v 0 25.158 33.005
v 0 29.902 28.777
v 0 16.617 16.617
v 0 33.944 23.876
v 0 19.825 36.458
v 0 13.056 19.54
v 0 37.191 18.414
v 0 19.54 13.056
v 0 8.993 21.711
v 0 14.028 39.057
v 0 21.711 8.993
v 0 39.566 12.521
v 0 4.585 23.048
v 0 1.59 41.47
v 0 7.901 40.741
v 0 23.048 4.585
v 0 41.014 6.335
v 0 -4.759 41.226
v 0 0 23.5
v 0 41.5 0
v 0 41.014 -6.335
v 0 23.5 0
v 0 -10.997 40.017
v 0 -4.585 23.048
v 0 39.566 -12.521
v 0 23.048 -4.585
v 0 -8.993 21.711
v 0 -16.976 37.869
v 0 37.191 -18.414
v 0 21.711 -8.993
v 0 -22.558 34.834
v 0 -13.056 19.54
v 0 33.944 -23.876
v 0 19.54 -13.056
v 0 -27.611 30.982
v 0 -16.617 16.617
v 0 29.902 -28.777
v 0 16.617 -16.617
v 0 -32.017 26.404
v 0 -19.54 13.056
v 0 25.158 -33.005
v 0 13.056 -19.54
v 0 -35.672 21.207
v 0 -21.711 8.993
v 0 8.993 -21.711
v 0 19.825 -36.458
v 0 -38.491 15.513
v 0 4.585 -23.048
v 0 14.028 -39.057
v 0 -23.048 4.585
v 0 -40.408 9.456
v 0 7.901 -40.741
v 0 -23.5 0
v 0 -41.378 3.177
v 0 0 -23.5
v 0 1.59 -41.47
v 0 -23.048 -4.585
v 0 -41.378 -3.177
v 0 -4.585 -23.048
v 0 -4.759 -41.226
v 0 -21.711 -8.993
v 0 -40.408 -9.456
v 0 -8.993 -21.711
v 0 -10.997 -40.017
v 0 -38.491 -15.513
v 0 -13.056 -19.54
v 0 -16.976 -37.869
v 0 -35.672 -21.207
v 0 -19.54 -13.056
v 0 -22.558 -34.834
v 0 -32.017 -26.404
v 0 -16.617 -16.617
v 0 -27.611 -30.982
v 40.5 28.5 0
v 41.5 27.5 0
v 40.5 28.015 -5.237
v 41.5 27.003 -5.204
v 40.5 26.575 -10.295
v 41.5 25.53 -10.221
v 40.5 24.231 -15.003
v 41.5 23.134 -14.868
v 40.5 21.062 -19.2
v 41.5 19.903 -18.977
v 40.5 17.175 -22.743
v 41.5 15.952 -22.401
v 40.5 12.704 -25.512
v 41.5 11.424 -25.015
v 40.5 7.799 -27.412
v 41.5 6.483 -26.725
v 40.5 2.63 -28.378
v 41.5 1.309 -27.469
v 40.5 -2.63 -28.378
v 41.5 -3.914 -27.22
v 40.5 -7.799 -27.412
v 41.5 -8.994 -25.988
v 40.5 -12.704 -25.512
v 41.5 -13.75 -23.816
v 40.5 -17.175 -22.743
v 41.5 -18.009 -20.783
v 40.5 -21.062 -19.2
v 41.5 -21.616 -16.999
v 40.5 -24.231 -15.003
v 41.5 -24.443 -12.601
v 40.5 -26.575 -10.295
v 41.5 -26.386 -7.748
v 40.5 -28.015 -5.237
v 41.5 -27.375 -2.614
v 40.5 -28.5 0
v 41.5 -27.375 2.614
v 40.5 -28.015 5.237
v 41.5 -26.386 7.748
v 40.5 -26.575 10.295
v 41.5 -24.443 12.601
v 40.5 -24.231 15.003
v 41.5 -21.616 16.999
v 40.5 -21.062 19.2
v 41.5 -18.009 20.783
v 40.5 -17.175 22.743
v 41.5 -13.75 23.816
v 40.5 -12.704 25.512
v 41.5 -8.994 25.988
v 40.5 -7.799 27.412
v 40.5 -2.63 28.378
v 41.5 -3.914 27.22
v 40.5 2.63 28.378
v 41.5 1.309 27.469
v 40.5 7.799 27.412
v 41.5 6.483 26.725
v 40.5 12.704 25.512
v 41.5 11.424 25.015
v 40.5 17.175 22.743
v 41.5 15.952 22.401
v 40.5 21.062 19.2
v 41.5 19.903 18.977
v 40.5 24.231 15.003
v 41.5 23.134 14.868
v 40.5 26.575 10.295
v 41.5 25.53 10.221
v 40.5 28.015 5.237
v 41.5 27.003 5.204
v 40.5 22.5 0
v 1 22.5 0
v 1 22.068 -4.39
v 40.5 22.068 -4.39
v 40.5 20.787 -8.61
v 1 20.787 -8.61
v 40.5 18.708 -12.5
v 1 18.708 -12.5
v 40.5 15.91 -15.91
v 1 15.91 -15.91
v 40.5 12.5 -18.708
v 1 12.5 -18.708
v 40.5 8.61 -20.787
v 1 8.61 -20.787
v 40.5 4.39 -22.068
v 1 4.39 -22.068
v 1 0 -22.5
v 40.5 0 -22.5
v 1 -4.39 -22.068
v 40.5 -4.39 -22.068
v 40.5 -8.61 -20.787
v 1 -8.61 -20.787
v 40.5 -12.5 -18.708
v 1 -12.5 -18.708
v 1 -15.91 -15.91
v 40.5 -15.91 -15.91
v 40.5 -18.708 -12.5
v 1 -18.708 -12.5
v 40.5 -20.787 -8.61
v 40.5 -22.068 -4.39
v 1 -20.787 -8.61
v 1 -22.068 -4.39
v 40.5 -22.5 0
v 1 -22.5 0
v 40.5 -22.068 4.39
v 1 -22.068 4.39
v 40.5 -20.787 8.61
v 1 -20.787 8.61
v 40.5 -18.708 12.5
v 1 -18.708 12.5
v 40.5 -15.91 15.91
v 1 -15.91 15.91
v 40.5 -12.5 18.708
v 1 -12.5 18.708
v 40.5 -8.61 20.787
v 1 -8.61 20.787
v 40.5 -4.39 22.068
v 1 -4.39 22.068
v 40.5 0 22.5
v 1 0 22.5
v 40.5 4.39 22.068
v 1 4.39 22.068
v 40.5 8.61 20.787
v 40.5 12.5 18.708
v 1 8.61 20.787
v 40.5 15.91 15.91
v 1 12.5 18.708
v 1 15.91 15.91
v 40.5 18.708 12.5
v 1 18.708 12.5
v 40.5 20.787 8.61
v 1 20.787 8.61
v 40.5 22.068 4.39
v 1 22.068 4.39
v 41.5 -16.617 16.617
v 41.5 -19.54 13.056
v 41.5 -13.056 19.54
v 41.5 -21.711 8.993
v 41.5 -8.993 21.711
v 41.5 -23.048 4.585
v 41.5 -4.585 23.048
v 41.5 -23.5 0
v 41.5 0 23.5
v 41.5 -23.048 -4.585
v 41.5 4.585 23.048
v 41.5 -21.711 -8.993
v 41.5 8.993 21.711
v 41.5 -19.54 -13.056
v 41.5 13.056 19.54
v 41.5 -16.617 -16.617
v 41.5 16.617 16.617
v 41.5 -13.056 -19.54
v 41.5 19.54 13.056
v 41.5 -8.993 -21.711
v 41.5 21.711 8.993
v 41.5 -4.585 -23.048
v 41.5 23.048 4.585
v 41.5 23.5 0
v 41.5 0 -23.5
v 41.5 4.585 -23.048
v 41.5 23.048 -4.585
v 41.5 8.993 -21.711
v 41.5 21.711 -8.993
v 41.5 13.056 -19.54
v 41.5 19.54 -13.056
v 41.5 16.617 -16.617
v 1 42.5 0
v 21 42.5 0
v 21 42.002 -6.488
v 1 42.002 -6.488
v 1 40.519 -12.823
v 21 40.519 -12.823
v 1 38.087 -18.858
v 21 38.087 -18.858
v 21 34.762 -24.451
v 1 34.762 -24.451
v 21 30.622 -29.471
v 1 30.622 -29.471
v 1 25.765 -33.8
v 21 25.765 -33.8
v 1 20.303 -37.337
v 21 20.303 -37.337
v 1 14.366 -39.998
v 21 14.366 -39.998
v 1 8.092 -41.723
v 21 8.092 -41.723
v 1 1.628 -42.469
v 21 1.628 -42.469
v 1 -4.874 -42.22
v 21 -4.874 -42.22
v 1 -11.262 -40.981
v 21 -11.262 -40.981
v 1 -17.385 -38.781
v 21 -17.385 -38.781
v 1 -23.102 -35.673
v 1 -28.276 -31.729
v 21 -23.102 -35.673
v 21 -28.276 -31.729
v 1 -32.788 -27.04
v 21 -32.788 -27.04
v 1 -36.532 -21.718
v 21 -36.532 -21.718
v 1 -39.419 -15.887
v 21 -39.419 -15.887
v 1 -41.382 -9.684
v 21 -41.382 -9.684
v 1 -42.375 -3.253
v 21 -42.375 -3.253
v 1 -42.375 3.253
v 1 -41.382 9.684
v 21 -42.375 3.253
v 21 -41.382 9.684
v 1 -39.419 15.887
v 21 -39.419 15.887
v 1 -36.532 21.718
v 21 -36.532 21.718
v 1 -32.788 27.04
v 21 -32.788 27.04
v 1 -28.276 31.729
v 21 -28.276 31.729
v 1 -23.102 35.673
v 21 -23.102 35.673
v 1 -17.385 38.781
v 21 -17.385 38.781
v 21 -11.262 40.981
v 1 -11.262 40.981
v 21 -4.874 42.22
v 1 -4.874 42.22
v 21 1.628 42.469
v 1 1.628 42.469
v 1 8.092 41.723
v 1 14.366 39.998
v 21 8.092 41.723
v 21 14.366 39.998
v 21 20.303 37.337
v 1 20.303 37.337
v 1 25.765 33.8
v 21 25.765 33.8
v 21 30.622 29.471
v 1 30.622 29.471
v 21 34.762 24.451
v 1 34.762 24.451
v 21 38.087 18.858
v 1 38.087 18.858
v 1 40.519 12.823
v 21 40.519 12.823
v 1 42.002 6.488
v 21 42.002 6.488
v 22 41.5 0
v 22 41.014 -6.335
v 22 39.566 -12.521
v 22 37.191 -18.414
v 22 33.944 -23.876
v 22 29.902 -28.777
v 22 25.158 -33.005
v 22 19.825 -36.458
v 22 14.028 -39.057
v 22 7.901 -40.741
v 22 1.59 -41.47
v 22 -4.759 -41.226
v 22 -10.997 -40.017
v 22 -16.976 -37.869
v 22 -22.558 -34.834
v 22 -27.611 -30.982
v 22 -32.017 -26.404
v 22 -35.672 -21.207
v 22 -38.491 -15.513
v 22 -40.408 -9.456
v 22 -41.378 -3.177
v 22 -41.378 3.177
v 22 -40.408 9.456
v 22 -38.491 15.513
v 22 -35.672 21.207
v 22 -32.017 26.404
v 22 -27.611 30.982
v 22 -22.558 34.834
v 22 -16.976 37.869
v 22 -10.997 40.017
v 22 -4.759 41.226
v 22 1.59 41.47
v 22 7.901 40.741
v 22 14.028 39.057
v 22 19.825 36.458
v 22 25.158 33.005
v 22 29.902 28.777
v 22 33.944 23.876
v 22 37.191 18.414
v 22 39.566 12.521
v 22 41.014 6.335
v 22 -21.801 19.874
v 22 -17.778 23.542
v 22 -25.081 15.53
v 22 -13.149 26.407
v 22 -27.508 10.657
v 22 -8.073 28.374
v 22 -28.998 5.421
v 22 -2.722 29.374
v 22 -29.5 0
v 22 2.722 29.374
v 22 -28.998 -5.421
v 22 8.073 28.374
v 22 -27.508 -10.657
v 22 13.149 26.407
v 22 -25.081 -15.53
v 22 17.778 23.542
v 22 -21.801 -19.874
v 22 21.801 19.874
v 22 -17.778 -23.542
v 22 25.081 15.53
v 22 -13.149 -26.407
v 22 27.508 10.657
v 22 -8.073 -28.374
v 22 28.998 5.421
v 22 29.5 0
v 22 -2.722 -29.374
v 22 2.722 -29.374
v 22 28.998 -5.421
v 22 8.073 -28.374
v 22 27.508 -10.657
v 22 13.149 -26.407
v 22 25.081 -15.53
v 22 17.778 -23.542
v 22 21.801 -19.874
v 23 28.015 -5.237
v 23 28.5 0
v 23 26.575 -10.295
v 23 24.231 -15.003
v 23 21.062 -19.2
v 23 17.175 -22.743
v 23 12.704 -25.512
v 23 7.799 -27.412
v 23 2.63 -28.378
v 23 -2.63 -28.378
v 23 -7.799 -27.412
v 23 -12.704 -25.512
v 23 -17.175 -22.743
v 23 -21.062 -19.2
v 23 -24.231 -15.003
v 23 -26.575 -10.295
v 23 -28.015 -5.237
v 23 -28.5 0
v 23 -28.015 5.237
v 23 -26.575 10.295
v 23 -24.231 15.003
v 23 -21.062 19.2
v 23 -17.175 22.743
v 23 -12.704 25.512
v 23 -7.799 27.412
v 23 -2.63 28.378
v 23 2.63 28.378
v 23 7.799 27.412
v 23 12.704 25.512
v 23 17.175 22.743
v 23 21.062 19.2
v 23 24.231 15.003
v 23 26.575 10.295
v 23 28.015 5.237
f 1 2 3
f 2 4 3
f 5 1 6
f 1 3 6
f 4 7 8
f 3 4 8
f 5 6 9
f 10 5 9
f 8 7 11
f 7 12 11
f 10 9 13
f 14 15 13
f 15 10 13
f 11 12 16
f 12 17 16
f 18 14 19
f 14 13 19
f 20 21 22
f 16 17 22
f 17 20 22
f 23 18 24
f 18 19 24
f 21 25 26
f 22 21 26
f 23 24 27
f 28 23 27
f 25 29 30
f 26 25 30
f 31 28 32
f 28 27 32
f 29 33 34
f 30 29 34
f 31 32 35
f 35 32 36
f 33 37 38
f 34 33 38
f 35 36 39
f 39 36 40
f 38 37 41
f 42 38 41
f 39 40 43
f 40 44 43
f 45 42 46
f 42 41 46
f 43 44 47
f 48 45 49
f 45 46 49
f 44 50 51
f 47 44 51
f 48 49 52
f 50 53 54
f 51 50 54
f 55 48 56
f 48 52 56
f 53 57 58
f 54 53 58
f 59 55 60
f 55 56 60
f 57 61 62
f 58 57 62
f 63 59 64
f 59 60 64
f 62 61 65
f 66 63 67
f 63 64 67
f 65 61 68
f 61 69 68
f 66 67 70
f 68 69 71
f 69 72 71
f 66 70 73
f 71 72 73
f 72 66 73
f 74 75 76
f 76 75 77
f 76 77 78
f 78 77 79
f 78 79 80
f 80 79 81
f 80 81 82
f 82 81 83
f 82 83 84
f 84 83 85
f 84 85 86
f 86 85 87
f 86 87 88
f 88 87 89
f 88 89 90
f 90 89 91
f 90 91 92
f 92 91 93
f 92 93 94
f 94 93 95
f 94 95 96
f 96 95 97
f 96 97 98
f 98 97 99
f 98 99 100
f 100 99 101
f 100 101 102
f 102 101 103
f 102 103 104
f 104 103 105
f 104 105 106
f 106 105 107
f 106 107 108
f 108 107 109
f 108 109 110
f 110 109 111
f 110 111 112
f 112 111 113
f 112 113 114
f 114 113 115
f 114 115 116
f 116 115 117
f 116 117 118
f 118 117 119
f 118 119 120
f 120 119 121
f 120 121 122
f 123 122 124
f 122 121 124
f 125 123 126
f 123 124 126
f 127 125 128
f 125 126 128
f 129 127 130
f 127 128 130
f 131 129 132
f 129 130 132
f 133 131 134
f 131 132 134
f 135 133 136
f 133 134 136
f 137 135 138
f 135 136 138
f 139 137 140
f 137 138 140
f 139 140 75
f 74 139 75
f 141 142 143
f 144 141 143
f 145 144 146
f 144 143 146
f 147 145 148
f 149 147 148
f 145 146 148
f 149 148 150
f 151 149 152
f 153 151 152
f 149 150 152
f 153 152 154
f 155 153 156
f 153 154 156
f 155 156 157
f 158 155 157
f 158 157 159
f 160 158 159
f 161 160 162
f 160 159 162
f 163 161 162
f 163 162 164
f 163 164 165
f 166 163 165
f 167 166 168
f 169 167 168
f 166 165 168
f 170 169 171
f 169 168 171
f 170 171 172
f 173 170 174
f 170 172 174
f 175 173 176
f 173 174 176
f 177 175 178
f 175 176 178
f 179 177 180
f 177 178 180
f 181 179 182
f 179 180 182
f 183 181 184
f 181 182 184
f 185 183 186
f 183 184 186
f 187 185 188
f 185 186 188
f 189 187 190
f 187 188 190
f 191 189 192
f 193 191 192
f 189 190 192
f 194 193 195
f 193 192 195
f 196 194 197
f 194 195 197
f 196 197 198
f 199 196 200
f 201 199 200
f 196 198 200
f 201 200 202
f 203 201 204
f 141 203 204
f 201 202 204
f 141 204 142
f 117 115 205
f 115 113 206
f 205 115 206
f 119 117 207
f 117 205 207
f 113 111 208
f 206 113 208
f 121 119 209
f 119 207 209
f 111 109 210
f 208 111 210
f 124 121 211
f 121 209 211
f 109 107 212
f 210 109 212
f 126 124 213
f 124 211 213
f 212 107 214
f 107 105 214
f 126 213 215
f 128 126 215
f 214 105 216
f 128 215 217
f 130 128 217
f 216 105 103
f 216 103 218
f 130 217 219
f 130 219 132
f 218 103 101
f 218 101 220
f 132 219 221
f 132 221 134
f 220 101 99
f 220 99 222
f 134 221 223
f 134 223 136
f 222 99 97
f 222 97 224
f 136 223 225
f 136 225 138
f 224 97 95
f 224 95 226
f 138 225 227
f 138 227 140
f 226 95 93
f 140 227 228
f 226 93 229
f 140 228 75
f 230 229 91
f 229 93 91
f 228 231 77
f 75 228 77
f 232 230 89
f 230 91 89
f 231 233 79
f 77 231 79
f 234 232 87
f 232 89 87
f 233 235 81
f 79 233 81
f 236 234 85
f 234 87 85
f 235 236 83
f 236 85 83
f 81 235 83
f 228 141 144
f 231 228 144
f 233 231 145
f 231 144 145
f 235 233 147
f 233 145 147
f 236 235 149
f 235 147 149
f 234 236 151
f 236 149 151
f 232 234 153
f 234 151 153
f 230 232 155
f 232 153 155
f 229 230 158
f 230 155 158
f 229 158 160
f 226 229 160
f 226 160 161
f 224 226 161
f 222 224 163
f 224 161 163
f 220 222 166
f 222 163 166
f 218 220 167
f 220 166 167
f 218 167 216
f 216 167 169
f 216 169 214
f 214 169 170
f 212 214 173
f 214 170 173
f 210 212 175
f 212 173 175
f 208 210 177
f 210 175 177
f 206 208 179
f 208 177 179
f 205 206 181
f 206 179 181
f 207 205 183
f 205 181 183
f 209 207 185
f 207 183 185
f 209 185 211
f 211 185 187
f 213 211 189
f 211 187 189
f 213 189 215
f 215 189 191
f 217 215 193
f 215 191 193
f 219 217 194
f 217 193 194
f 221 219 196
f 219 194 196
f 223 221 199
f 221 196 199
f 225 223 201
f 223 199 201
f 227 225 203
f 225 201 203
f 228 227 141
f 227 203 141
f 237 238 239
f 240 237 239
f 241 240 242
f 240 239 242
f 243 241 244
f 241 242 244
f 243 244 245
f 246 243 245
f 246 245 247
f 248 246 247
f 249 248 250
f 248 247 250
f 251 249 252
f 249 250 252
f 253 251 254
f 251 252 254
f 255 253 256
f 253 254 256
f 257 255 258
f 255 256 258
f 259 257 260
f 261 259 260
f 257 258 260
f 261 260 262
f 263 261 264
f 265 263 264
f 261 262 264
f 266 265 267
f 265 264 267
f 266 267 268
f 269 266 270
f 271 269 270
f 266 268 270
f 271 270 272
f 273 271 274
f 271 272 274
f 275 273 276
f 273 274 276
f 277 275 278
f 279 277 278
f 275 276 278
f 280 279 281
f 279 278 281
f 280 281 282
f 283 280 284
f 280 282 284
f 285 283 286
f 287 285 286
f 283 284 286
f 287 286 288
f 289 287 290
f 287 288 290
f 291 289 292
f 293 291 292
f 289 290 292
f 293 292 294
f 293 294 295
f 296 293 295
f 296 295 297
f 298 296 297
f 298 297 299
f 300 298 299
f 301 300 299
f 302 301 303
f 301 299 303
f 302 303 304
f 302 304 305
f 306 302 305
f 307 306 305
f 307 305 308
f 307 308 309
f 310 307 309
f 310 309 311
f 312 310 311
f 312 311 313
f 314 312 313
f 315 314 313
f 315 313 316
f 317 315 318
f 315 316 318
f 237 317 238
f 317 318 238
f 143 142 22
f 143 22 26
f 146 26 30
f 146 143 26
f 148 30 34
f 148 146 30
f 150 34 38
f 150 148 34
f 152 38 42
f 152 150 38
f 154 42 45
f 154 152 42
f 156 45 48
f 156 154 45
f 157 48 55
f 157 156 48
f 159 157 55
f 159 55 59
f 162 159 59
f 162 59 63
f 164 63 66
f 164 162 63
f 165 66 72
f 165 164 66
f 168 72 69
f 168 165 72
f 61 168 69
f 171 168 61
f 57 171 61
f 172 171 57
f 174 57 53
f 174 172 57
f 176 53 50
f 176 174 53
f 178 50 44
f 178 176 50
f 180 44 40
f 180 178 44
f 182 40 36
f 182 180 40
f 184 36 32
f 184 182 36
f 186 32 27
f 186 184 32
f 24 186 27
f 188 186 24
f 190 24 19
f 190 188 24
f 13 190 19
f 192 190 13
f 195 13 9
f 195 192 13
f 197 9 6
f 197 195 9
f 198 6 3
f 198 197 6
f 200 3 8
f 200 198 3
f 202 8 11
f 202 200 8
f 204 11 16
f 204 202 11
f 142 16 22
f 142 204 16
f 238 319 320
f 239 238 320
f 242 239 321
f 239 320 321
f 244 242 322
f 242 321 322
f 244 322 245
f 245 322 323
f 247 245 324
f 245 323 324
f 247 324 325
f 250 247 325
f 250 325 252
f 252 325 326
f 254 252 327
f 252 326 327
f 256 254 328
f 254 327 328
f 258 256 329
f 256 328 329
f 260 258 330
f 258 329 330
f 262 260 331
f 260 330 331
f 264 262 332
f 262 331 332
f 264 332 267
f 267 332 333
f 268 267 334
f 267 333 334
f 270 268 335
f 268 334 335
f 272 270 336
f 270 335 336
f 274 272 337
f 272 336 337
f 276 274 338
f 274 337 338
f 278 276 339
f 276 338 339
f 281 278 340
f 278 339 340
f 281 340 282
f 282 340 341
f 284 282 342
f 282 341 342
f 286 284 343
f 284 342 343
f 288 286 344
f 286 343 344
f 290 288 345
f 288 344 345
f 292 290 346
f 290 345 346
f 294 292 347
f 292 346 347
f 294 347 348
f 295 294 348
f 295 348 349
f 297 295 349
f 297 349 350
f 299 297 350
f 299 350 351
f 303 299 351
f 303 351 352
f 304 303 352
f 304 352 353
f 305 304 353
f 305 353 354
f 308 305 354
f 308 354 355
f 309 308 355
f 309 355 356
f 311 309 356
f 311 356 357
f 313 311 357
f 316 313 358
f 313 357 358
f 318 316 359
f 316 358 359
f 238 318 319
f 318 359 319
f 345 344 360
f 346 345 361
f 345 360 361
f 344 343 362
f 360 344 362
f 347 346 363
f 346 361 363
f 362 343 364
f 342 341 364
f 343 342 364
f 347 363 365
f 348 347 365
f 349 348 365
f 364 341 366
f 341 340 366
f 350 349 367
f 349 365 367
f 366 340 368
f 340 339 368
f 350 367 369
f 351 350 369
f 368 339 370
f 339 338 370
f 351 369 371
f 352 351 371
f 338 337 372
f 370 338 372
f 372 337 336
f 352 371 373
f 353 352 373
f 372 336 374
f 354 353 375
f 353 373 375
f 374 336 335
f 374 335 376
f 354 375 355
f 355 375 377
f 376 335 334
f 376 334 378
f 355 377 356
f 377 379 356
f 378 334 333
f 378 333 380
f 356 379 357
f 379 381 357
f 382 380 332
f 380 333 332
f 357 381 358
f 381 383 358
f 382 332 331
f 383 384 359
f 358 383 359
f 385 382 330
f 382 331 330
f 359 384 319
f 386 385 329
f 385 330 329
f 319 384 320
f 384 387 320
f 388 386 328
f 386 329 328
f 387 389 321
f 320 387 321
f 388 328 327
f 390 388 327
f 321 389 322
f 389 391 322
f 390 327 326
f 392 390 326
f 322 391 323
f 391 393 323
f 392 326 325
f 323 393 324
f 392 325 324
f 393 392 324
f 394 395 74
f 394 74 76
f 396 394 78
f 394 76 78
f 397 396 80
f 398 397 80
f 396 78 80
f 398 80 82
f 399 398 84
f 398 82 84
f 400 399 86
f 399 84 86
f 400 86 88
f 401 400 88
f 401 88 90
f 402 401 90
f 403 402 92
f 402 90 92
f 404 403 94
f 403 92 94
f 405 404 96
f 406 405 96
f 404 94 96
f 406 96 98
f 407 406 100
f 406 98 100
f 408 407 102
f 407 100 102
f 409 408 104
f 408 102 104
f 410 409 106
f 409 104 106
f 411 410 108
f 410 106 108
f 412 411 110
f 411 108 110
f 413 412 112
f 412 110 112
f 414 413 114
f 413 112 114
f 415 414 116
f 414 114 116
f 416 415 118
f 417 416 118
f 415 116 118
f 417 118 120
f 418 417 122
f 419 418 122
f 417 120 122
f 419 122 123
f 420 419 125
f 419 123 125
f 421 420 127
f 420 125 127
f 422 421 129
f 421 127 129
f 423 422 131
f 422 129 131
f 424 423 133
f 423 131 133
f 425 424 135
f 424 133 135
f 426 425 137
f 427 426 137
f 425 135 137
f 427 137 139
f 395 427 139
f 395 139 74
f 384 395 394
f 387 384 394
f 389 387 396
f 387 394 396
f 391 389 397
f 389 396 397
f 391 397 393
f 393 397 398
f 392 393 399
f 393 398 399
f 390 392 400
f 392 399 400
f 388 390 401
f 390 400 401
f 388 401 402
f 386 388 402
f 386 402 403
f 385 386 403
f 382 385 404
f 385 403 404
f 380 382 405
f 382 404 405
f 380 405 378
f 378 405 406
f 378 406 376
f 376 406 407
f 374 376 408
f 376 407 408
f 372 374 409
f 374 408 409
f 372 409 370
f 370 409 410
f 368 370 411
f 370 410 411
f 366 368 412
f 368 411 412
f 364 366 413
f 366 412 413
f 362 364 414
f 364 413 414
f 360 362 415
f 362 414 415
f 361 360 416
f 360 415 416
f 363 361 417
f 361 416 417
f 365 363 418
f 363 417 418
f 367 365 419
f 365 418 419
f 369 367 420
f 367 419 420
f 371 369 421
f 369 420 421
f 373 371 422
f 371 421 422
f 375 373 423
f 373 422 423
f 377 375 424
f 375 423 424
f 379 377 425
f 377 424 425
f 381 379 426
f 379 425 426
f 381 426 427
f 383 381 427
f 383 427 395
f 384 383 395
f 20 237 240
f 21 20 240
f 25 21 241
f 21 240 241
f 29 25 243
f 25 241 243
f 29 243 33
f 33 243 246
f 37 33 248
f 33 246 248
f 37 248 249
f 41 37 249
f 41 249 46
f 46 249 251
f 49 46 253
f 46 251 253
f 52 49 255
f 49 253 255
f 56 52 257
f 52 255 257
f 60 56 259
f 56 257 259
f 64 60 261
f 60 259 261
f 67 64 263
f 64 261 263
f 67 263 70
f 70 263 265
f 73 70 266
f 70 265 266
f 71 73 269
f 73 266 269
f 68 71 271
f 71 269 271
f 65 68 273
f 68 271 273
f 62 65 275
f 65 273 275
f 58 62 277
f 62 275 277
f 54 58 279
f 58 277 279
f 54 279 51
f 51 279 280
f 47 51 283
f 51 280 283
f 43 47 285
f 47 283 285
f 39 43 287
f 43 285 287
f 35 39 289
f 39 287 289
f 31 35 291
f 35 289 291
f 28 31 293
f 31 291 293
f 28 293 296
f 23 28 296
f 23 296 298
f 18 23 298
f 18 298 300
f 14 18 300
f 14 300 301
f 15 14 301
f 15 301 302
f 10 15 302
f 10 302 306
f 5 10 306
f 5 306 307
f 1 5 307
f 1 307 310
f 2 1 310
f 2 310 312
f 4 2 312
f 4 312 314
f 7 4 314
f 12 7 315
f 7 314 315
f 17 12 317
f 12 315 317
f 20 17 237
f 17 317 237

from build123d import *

# Parameters (mm, degrees)
CHAMFER1_SIZE = 1


with BuildPart() as part:
    # Sketch1 → Revolve1 (revolve)
    with BuildSketch(Plane.XY):
        Polygon((0, 22.5), (0, 42.5), (22, 42.5), (22, 28.5), (41.5, 28.5), (41.5, 22.5), align=None)
    revolve(axis=Axis((43.575, 0, 0), (-1, 0, 0)))

    # Chamfer1
    chamfer1_edges = [part.edges().sort_by_distance(p)[0] for p in [
        (0, -42.5, 0),
        (0, -22.5, 0),
        (41.5, -22.5, 0),
        (41.5, -28.5, 0),
        (22, -28.5, 0),
        (22, -42.5, 0),
    ]]
    chamfer(chamfer1_edges, length=CHAMFER1_SIZE)


solid = part.part
